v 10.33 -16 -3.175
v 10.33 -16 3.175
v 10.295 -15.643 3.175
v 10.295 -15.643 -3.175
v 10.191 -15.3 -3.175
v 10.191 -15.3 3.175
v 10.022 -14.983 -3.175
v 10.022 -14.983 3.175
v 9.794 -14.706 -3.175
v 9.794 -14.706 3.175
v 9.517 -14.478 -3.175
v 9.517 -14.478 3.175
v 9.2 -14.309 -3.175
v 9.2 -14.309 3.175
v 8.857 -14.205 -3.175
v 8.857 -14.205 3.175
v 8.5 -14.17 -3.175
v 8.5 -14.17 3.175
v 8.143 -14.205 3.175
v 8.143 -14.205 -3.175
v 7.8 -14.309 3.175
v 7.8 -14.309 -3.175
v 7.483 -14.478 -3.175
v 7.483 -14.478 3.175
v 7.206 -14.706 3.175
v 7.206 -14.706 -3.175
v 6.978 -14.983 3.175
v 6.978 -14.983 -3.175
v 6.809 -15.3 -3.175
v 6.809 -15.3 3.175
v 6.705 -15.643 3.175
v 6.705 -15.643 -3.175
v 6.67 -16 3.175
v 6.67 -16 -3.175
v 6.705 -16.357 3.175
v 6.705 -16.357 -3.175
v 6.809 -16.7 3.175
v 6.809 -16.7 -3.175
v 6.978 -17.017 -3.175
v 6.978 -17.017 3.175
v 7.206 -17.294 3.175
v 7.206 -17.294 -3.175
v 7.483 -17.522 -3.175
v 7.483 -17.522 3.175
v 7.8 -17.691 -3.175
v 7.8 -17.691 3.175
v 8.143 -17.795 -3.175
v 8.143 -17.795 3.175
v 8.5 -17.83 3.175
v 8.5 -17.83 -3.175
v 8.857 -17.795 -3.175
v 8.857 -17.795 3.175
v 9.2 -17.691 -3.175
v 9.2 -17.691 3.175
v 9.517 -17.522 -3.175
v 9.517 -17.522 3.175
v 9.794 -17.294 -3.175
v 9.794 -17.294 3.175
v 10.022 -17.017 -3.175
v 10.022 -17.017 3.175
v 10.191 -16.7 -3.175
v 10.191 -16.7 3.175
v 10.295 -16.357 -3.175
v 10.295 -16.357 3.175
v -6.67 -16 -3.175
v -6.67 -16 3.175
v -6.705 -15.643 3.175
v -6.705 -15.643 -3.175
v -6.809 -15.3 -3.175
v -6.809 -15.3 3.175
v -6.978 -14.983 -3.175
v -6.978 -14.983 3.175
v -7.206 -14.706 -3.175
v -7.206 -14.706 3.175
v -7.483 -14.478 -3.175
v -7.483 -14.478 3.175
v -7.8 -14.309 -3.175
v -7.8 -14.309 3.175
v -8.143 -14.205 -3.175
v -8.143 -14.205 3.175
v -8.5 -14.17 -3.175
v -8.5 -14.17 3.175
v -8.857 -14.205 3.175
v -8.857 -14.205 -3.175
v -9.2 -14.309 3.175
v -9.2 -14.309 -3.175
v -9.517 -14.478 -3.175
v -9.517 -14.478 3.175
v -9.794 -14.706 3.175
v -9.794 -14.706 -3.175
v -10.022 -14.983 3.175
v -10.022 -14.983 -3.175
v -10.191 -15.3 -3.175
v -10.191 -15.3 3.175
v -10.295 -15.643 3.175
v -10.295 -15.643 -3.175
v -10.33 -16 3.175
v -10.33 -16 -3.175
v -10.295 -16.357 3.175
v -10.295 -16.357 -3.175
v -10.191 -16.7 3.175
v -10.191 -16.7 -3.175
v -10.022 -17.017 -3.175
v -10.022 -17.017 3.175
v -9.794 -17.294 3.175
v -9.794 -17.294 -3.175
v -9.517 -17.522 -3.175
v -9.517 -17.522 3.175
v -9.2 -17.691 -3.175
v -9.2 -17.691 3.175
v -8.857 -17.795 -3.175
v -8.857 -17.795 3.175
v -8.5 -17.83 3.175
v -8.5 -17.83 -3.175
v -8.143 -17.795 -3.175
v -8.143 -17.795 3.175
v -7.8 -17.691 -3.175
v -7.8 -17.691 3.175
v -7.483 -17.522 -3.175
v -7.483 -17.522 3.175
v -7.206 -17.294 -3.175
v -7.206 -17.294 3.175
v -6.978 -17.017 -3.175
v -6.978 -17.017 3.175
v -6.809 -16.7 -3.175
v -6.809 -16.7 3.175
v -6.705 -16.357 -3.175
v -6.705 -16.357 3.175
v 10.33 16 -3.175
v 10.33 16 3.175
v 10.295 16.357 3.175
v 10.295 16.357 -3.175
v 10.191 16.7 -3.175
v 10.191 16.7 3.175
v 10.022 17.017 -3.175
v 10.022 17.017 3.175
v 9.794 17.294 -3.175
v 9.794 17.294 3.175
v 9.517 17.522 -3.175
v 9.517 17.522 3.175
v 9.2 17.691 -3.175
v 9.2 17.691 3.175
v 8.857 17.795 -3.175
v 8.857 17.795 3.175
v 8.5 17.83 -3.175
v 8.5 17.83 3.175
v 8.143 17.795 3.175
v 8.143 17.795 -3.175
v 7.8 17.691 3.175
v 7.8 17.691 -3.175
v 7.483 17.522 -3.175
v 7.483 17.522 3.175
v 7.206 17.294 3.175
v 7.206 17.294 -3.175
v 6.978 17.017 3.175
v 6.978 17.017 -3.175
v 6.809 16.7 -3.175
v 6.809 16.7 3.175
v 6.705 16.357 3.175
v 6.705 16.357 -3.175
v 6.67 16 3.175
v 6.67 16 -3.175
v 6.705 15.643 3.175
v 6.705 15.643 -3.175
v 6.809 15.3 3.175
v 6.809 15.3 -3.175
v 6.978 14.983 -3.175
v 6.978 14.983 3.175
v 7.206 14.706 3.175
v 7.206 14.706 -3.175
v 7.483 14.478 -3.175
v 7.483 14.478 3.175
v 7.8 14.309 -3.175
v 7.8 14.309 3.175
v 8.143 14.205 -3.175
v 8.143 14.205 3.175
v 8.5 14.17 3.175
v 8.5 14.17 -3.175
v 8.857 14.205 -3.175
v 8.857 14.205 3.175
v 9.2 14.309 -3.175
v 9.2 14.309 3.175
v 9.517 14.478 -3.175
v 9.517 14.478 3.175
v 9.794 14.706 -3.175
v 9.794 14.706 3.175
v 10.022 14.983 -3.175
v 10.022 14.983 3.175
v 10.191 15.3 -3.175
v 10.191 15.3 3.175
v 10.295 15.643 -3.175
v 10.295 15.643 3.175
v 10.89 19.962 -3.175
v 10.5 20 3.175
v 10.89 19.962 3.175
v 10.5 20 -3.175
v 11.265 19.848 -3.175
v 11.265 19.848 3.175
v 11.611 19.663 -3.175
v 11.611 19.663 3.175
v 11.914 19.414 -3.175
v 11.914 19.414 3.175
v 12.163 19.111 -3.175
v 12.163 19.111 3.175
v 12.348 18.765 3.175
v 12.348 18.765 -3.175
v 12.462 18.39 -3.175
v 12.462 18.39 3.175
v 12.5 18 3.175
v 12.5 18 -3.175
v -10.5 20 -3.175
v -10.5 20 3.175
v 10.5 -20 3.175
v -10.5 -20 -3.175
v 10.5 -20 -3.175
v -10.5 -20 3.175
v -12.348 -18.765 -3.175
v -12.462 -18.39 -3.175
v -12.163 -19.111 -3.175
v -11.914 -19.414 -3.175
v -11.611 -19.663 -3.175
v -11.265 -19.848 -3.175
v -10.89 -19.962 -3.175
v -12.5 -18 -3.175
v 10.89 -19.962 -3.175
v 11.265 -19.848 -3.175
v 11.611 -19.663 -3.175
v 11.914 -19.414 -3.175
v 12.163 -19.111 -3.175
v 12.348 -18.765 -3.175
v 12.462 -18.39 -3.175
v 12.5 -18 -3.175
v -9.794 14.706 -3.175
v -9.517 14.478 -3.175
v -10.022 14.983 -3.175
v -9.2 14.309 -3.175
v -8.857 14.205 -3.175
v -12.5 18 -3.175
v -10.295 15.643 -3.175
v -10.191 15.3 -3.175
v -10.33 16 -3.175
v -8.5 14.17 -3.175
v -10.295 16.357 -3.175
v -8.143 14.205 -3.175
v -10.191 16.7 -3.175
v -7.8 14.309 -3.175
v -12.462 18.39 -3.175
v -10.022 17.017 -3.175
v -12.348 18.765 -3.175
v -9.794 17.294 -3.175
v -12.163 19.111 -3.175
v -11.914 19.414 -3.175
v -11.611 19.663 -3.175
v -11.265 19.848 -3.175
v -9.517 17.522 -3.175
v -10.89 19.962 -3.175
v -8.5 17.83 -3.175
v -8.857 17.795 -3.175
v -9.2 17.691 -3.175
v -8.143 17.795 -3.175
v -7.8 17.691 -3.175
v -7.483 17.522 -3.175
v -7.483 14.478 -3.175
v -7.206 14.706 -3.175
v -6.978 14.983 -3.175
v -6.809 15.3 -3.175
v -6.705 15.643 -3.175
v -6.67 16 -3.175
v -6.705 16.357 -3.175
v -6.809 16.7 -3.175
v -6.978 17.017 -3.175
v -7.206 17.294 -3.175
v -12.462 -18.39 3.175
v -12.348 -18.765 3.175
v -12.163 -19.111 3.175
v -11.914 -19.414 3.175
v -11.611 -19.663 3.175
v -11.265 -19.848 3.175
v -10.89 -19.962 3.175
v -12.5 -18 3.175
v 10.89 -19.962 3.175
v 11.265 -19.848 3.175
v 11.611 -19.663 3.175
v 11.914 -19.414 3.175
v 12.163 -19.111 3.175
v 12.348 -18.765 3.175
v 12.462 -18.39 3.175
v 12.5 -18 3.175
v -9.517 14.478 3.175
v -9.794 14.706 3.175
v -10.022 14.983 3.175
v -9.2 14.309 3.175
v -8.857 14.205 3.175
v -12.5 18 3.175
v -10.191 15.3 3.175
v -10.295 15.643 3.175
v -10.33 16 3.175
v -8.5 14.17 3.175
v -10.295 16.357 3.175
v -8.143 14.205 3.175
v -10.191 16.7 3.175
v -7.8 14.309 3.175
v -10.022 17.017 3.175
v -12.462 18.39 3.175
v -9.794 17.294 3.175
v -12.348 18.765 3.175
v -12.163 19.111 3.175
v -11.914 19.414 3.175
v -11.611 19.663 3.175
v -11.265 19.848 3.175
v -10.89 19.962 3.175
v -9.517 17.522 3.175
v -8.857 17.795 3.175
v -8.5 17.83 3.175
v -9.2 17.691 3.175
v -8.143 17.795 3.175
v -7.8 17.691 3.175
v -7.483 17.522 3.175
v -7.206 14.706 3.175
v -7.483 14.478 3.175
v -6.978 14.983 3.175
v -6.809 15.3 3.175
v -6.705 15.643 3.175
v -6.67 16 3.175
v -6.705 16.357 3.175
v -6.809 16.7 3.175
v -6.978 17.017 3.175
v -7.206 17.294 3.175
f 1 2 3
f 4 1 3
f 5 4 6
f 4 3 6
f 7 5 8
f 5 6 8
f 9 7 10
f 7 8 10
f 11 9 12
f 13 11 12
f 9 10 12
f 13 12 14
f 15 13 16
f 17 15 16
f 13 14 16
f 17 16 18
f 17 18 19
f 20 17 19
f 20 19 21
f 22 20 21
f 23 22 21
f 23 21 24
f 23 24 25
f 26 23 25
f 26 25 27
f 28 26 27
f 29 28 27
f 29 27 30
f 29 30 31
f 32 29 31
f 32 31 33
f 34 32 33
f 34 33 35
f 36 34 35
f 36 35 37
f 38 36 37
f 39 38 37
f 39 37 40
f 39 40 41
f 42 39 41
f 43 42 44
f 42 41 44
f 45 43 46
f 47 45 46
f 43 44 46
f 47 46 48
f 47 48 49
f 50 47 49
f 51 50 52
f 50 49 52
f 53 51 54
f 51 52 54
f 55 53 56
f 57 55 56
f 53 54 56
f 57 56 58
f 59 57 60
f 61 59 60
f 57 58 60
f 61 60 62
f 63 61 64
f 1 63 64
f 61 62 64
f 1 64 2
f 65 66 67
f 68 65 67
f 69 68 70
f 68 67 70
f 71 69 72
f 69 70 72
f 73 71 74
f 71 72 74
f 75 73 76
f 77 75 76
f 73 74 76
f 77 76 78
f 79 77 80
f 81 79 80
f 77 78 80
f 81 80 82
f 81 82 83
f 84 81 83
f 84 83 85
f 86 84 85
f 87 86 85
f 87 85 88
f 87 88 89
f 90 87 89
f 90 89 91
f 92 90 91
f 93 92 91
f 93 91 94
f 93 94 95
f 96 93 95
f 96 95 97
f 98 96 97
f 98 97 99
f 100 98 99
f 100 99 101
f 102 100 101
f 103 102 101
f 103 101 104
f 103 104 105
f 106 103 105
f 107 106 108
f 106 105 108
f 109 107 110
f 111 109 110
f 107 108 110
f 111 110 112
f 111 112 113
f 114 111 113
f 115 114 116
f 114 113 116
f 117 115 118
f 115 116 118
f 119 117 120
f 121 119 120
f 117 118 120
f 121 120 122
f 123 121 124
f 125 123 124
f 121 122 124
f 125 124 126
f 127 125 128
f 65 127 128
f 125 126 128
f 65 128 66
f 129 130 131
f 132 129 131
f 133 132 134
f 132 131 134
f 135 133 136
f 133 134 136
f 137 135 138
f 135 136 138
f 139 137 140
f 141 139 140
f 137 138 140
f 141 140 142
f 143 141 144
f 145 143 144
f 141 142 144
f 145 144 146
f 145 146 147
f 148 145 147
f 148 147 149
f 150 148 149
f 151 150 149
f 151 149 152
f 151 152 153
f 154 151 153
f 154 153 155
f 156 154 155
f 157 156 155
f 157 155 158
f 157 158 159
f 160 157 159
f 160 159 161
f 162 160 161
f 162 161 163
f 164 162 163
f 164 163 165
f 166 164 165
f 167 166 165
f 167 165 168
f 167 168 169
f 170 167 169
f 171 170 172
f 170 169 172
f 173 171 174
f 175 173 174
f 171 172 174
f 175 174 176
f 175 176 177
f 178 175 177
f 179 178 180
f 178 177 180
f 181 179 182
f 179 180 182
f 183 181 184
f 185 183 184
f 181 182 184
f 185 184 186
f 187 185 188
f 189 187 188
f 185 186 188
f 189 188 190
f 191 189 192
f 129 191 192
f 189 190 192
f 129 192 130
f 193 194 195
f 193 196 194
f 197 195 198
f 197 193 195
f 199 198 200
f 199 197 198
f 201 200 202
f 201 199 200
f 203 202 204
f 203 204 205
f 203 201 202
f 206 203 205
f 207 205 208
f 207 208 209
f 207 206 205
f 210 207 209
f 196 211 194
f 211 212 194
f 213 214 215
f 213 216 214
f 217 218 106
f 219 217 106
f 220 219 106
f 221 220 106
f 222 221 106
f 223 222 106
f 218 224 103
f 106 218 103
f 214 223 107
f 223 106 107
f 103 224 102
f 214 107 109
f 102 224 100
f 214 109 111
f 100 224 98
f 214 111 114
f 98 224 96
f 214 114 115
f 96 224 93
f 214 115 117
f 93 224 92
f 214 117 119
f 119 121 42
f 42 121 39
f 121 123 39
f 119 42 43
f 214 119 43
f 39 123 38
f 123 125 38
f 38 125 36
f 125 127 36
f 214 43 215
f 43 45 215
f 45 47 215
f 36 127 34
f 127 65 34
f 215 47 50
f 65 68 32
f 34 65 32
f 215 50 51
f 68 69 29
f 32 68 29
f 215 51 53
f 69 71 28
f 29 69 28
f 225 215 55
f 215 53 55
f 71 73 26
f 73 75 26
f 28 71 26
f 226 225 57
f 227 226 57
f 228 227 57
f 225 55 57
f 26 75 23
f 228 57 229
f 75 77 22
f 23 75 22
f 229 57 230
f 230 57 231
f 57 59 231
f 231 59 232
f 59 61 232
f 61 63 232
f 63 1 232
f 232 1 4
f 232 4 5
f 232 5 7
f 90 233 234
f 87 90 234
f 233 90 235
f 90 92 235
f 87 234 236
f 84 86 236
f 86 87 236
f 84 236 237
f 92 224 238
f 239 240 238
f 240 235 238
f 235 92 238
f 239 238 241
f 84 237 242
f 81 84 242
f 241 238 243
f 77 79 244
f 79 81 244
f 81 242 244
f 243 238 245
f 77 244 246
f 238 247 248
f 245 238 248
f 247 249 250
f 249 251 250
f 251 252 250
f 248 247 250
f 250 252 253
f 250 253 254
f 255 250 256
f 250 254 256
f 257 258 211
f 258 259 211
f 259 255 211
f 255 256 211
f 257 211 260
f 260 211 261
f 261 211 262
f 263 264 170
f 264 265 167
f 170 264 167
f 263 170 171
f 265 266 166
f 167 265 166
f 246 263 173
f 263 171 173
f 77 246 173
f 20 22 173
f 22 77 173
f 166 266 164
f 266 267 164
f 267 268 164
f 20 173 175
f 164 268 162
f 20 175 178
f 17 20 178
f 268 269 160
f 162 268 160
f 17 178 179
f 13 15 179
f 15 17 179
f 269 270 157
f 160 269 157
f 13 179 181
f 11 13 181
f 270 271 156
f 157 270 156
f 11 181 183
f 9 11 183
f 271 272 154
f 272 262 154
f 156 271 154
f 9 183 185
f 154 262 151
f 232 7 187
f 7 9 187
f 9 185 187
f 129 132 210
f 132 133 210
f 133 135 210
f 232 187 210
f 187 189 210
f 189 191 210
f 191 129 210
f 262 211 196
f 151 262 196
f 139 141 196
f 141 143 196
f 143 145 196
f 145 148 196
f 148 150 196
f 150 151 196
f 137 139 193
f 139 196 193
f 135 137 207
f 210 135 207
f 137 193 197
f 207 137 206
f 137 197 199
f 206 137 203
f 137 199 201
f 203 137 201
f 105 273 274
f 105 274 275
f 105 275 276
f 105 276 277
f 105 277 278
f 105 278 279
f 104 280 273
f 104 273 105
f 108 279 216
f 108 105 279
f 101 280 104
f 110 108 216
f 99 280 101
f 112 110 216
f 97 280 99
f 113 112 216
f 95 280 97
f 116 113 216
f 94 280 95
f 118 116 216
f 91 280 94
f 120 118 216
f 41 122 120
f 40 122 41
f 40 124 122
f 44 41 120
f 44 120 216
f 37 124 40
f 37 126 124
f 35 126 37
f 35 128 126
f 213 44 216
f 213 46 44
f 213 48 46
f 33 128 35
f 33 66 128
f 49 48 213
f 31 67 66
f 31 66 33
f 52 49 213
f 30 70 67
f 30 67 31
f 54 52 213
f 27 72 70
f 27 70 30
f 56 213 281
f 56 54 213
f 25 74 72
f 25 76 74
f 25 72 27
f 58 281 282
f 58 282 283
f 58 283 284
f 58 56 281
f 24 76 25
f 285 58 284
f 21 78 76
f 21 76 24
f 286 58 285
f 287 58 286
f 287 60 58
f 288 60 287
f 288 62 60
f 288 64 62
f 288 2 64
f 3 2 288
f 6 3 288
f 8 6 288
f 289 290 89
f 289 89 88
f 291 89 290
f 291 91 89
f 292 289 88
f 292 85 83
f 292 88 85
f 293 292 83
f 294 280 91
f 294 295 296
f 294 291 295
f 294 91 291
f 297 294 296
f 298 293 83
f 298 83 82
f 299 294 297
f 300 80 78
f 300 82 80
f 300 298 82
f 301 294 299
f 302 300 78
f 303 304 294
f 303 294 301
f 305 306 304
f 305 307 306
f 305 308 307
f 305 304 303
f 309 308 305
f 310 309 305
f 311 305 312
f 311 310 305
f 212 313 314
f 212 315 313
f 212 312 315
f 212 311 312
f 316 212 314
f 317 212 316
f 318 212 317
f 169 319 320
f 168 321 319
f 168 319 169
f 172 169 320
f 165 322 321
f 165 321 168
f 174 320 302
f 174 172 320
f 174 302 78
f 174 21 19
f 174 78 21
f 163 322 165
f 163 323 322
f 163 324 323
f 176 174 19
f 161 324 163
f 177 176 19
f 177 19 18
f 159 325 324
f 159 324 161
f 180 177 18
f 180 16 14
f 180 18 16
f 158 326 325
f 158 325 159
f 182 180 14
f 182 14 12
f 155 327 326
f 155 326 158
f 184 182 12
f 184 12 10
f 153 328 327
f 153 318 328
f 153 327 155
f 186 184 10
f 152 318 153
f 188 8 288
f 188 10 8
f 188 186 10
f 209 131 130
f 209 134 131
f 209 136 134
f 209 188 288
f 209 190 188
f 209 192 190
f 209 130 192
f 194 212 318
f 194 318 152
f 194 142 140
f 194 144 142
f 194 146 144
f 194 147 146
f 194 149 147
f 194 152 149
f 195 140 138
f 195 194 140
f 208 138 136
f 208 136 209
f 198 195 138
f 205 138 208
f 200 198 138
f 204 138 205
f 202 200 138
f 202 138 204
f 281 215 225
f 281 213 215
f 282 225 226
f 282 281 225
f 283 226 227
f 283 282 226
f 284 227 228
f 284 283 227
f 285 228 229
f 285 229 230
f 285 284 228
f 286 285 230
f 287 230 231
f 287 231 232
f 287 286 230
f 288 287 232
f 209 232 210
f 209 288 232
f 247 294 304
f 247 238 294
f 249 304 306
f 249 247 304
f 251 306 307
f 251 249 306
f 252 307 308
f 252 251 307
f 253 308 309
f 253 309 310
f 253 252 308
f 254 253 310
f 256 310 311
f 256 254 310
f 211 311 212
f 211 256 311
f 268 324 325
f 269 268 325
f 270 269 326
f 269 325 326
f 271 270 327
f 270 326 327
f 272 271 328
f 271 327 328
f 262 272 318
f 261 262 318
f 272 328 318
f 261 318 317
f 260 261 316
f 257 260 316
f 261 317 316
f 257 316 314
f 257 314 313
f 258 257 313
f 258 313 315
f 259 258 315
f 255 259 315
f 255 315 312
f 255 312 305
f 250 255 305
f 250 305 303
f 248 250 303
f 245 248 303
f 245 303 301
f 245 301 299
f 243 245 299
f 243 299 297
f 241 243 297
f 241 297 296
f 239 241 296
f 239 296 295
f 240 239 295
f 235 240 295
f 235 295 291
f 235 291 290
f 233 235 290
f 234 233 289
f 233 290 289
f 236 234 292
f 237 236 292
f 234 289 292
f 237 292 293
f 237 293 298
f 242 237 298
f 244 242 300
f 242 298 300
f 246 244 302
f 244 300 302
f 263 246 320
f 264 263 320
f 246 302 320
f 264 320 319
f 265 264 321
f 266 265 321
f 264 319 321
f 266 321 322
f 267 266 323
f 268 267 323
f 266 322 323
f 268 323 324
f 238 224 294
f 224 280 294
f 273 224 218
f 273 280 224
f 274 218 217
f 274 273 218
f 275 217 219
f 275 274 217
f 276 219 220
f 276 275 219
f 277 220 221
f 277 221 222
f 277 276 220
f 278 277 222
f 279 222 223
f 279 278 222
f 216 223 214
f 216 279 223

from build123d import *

# Parameters (mm, degrees)
ESQUISSE1_W             = 25
ESQUISSE1_H             = 40
BOSS_EXTRU_1_DEPTH      = 3.175
ENL_V_MAT_EXTRU_1_REACH = 26.425
ESQUISSE2_R             = 1.83
CONG_1_R                = 2


with BuildPart() as part:
    # Esquisse1 → Boss.-Extru.1 (new, symmetric)
    with BuildSketch(Plane.XY):
        Rectangle(ESQUISSE1_W, ESQUISSE1_H)
    extrude(amount=BOSS_EXTRU_1_DEPTH, both=True)

    # Esquisse2 → Enlèv. mat.-Extru.1 (cut, up to next)
    with BuildSketch(Plane.XY.offset(3.175), mode=Mode.PRIVATE) as enl_v_mat_extru_1_sk1:
        with Locations((-8.5, 16)):
            Circle(ESQUISSE2_R)
    enl_v_mat_extru_1_tool1 = extrude(enl_v_mat_extru_1_sk1.sketch, amount=-ENL_V_MAT_EXTRU_1_REACH, mode=Mode.PRIVATE) & part.part
    # Esquisse2 → Enlèv. mat.-Extru.1 (cut, up to next)
    with BuildSketch(Plane.XY.offset(3.175), mode=Mode.PRIVATE) as enl_v_mat_extru_1_sk2:
        with Locations((8.5, 16)):
            Circle(ESQUISSE2_R)
    enl_v_mat_extru_1_tool2 = extrude(enl_v_mat_extru_1_sk2.sketch, amount=-ENL_V_MAT_EXTRU_1_REACH, mode=Mode.PRIVATE) & part.part
    # Esquisse2 → Enlèv. mat.-Extru.1 (cut, up to next)
    with BuildSketch(Plane.XY.offset(3.175), mode=Mode.PRIVATE) as enl_v_mat_extru_1_sk3:
        with Locations((8.5, -16)):
            Circle(ESQUISSE2_R)
    enl_v_mat_extru_1_tool3 = extrude(enl_v_mat_extru_1_sk3.sketch, amount=-ENL_V_MAT_EXTRU_1_REACH, mode=Mode.PRIVATE) & part.part
    # Esquisse2 → Enlèv. mat.-Extru.1 (cut, up to next)
    with BuildSketch(Plane.XY.offset(3.175), mode=Mode.PRIVATE) as enl_v_mat_extru_1_sk4:
        with Locations((-8.5, -16)):
            Circle(ESQUISSE2_R)
    enl_v_mat_extru_1_tool4 = extrude(enl_v_mat_extru_1_sk4.sketch, amount=-ENL_V_MAT_EXTRU_1_REACH, mode=Mode.PRIVATE) & part.part
    add(enl_v_mat_extru_1_tool1.solids().sort_by_distance((-8.5, 16, 3.175))[0], mode=Mode.SUBTRACT)
    add(enl_v_mat_extru_1_tool2.solids().sort_by_distance((8.5, 16, 3.175))[0], mode=Mode.SUBTRACT)
    add(enl_v_mat_extru_1_tool3.solids().sort_by_distance((8.5, -16, 3.175))[0], mode=Mode.SUBTRACT)
    add(enl_v_mat_extru_1_tool4.solids().sort_by_distance((-8.5, -16, 3.175))[0], mode=Mode.SUBTRACT)

    # Congé1
    cong_1_edges = [part.edges().sort_by_distance(p)[0] for p in [
        (-12.5, 20, 0),
        (12.5, 20, 0),
        (12.5, -20, 0),
        (-12.5, -20, 0),
    ]]
    fillet(cong_1_edges, radius=CONG_1_R)


solid = part.part
